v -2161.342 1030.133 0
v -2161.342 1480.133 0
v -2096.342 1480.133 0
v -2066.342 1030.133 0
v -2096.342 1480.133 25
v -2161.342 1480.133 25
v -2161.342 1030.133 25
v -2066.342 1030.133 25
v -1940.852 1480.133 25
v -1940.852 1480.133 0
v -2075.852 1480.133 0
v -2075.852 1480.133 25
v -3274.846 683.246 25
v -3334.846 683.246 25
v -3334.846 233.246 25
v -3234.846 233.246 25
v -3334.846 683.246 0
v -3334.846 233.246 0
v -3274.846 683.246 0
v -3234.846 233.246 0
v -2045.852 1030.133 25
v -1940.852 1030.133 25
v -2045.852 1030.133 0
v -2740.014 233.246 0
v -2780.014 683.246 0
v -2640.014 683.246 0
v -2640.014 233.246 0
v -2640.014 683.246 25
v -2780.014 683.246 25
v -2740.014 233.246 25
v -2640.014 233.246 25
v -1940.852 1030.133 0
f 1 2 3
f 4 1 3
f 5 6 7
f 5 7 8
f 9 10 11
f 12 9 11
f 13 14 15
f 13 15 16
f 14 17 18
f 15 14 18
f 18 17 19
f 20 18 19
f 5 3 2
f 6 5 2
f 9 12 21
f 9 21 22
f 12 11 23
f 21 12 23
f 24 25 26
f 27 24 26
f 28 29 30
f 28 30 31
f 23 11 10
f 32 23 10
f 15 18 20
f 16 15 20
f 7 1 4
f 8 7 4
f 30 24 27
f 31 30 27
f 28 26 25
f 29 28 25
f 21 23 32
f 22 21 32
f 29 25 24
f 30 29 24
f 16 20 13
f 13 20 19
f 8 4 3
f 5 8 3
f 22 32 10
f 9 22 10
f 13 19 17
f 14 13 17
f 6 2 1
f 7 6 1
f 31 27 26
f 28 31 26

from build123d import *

# Parameters (mm, degrees)
F1_DEPTH = 25
F3_DEPTH = 25


with BuildPart() as f1:
    # F0 (on Top) → F1 (new body)
    with BuildSketch(Plane.XY):
        Polygon((-2096.341906, 1480.133367), (-2161.341906, 1480.133367), (-2161.341906, 1030.133367), (-2066.341906, 1030.133367), align=None)
        Polygon((-1940.851974, 1480.133414), (-2075.851974, 1480.133414), (-2045.851974, 1030.133414), (-1940.851974, 1030.133414), align=None)
    extrude(amount=F1_DEPTH)


with BuildPart() as f3:
    # F2 (on Top) → F3 (new body)
    with BuildSketch(Plane.XY):
        Polygon((-2640.013981, 683.245656), (-2780.013981, 683.245656), (-2740.013981, 233.245656), (-2640.013981, 233.245656), align=None)
        Polygon((-3234.846497, 233.245656), (-3274.846497, 683.245656), (-3334.846497, 683.245656), (-3334.846497, 233.245656), align=None)
    extrude(amount=F3_DEPTH)


solid = Compound([f1.part, f3.part])
